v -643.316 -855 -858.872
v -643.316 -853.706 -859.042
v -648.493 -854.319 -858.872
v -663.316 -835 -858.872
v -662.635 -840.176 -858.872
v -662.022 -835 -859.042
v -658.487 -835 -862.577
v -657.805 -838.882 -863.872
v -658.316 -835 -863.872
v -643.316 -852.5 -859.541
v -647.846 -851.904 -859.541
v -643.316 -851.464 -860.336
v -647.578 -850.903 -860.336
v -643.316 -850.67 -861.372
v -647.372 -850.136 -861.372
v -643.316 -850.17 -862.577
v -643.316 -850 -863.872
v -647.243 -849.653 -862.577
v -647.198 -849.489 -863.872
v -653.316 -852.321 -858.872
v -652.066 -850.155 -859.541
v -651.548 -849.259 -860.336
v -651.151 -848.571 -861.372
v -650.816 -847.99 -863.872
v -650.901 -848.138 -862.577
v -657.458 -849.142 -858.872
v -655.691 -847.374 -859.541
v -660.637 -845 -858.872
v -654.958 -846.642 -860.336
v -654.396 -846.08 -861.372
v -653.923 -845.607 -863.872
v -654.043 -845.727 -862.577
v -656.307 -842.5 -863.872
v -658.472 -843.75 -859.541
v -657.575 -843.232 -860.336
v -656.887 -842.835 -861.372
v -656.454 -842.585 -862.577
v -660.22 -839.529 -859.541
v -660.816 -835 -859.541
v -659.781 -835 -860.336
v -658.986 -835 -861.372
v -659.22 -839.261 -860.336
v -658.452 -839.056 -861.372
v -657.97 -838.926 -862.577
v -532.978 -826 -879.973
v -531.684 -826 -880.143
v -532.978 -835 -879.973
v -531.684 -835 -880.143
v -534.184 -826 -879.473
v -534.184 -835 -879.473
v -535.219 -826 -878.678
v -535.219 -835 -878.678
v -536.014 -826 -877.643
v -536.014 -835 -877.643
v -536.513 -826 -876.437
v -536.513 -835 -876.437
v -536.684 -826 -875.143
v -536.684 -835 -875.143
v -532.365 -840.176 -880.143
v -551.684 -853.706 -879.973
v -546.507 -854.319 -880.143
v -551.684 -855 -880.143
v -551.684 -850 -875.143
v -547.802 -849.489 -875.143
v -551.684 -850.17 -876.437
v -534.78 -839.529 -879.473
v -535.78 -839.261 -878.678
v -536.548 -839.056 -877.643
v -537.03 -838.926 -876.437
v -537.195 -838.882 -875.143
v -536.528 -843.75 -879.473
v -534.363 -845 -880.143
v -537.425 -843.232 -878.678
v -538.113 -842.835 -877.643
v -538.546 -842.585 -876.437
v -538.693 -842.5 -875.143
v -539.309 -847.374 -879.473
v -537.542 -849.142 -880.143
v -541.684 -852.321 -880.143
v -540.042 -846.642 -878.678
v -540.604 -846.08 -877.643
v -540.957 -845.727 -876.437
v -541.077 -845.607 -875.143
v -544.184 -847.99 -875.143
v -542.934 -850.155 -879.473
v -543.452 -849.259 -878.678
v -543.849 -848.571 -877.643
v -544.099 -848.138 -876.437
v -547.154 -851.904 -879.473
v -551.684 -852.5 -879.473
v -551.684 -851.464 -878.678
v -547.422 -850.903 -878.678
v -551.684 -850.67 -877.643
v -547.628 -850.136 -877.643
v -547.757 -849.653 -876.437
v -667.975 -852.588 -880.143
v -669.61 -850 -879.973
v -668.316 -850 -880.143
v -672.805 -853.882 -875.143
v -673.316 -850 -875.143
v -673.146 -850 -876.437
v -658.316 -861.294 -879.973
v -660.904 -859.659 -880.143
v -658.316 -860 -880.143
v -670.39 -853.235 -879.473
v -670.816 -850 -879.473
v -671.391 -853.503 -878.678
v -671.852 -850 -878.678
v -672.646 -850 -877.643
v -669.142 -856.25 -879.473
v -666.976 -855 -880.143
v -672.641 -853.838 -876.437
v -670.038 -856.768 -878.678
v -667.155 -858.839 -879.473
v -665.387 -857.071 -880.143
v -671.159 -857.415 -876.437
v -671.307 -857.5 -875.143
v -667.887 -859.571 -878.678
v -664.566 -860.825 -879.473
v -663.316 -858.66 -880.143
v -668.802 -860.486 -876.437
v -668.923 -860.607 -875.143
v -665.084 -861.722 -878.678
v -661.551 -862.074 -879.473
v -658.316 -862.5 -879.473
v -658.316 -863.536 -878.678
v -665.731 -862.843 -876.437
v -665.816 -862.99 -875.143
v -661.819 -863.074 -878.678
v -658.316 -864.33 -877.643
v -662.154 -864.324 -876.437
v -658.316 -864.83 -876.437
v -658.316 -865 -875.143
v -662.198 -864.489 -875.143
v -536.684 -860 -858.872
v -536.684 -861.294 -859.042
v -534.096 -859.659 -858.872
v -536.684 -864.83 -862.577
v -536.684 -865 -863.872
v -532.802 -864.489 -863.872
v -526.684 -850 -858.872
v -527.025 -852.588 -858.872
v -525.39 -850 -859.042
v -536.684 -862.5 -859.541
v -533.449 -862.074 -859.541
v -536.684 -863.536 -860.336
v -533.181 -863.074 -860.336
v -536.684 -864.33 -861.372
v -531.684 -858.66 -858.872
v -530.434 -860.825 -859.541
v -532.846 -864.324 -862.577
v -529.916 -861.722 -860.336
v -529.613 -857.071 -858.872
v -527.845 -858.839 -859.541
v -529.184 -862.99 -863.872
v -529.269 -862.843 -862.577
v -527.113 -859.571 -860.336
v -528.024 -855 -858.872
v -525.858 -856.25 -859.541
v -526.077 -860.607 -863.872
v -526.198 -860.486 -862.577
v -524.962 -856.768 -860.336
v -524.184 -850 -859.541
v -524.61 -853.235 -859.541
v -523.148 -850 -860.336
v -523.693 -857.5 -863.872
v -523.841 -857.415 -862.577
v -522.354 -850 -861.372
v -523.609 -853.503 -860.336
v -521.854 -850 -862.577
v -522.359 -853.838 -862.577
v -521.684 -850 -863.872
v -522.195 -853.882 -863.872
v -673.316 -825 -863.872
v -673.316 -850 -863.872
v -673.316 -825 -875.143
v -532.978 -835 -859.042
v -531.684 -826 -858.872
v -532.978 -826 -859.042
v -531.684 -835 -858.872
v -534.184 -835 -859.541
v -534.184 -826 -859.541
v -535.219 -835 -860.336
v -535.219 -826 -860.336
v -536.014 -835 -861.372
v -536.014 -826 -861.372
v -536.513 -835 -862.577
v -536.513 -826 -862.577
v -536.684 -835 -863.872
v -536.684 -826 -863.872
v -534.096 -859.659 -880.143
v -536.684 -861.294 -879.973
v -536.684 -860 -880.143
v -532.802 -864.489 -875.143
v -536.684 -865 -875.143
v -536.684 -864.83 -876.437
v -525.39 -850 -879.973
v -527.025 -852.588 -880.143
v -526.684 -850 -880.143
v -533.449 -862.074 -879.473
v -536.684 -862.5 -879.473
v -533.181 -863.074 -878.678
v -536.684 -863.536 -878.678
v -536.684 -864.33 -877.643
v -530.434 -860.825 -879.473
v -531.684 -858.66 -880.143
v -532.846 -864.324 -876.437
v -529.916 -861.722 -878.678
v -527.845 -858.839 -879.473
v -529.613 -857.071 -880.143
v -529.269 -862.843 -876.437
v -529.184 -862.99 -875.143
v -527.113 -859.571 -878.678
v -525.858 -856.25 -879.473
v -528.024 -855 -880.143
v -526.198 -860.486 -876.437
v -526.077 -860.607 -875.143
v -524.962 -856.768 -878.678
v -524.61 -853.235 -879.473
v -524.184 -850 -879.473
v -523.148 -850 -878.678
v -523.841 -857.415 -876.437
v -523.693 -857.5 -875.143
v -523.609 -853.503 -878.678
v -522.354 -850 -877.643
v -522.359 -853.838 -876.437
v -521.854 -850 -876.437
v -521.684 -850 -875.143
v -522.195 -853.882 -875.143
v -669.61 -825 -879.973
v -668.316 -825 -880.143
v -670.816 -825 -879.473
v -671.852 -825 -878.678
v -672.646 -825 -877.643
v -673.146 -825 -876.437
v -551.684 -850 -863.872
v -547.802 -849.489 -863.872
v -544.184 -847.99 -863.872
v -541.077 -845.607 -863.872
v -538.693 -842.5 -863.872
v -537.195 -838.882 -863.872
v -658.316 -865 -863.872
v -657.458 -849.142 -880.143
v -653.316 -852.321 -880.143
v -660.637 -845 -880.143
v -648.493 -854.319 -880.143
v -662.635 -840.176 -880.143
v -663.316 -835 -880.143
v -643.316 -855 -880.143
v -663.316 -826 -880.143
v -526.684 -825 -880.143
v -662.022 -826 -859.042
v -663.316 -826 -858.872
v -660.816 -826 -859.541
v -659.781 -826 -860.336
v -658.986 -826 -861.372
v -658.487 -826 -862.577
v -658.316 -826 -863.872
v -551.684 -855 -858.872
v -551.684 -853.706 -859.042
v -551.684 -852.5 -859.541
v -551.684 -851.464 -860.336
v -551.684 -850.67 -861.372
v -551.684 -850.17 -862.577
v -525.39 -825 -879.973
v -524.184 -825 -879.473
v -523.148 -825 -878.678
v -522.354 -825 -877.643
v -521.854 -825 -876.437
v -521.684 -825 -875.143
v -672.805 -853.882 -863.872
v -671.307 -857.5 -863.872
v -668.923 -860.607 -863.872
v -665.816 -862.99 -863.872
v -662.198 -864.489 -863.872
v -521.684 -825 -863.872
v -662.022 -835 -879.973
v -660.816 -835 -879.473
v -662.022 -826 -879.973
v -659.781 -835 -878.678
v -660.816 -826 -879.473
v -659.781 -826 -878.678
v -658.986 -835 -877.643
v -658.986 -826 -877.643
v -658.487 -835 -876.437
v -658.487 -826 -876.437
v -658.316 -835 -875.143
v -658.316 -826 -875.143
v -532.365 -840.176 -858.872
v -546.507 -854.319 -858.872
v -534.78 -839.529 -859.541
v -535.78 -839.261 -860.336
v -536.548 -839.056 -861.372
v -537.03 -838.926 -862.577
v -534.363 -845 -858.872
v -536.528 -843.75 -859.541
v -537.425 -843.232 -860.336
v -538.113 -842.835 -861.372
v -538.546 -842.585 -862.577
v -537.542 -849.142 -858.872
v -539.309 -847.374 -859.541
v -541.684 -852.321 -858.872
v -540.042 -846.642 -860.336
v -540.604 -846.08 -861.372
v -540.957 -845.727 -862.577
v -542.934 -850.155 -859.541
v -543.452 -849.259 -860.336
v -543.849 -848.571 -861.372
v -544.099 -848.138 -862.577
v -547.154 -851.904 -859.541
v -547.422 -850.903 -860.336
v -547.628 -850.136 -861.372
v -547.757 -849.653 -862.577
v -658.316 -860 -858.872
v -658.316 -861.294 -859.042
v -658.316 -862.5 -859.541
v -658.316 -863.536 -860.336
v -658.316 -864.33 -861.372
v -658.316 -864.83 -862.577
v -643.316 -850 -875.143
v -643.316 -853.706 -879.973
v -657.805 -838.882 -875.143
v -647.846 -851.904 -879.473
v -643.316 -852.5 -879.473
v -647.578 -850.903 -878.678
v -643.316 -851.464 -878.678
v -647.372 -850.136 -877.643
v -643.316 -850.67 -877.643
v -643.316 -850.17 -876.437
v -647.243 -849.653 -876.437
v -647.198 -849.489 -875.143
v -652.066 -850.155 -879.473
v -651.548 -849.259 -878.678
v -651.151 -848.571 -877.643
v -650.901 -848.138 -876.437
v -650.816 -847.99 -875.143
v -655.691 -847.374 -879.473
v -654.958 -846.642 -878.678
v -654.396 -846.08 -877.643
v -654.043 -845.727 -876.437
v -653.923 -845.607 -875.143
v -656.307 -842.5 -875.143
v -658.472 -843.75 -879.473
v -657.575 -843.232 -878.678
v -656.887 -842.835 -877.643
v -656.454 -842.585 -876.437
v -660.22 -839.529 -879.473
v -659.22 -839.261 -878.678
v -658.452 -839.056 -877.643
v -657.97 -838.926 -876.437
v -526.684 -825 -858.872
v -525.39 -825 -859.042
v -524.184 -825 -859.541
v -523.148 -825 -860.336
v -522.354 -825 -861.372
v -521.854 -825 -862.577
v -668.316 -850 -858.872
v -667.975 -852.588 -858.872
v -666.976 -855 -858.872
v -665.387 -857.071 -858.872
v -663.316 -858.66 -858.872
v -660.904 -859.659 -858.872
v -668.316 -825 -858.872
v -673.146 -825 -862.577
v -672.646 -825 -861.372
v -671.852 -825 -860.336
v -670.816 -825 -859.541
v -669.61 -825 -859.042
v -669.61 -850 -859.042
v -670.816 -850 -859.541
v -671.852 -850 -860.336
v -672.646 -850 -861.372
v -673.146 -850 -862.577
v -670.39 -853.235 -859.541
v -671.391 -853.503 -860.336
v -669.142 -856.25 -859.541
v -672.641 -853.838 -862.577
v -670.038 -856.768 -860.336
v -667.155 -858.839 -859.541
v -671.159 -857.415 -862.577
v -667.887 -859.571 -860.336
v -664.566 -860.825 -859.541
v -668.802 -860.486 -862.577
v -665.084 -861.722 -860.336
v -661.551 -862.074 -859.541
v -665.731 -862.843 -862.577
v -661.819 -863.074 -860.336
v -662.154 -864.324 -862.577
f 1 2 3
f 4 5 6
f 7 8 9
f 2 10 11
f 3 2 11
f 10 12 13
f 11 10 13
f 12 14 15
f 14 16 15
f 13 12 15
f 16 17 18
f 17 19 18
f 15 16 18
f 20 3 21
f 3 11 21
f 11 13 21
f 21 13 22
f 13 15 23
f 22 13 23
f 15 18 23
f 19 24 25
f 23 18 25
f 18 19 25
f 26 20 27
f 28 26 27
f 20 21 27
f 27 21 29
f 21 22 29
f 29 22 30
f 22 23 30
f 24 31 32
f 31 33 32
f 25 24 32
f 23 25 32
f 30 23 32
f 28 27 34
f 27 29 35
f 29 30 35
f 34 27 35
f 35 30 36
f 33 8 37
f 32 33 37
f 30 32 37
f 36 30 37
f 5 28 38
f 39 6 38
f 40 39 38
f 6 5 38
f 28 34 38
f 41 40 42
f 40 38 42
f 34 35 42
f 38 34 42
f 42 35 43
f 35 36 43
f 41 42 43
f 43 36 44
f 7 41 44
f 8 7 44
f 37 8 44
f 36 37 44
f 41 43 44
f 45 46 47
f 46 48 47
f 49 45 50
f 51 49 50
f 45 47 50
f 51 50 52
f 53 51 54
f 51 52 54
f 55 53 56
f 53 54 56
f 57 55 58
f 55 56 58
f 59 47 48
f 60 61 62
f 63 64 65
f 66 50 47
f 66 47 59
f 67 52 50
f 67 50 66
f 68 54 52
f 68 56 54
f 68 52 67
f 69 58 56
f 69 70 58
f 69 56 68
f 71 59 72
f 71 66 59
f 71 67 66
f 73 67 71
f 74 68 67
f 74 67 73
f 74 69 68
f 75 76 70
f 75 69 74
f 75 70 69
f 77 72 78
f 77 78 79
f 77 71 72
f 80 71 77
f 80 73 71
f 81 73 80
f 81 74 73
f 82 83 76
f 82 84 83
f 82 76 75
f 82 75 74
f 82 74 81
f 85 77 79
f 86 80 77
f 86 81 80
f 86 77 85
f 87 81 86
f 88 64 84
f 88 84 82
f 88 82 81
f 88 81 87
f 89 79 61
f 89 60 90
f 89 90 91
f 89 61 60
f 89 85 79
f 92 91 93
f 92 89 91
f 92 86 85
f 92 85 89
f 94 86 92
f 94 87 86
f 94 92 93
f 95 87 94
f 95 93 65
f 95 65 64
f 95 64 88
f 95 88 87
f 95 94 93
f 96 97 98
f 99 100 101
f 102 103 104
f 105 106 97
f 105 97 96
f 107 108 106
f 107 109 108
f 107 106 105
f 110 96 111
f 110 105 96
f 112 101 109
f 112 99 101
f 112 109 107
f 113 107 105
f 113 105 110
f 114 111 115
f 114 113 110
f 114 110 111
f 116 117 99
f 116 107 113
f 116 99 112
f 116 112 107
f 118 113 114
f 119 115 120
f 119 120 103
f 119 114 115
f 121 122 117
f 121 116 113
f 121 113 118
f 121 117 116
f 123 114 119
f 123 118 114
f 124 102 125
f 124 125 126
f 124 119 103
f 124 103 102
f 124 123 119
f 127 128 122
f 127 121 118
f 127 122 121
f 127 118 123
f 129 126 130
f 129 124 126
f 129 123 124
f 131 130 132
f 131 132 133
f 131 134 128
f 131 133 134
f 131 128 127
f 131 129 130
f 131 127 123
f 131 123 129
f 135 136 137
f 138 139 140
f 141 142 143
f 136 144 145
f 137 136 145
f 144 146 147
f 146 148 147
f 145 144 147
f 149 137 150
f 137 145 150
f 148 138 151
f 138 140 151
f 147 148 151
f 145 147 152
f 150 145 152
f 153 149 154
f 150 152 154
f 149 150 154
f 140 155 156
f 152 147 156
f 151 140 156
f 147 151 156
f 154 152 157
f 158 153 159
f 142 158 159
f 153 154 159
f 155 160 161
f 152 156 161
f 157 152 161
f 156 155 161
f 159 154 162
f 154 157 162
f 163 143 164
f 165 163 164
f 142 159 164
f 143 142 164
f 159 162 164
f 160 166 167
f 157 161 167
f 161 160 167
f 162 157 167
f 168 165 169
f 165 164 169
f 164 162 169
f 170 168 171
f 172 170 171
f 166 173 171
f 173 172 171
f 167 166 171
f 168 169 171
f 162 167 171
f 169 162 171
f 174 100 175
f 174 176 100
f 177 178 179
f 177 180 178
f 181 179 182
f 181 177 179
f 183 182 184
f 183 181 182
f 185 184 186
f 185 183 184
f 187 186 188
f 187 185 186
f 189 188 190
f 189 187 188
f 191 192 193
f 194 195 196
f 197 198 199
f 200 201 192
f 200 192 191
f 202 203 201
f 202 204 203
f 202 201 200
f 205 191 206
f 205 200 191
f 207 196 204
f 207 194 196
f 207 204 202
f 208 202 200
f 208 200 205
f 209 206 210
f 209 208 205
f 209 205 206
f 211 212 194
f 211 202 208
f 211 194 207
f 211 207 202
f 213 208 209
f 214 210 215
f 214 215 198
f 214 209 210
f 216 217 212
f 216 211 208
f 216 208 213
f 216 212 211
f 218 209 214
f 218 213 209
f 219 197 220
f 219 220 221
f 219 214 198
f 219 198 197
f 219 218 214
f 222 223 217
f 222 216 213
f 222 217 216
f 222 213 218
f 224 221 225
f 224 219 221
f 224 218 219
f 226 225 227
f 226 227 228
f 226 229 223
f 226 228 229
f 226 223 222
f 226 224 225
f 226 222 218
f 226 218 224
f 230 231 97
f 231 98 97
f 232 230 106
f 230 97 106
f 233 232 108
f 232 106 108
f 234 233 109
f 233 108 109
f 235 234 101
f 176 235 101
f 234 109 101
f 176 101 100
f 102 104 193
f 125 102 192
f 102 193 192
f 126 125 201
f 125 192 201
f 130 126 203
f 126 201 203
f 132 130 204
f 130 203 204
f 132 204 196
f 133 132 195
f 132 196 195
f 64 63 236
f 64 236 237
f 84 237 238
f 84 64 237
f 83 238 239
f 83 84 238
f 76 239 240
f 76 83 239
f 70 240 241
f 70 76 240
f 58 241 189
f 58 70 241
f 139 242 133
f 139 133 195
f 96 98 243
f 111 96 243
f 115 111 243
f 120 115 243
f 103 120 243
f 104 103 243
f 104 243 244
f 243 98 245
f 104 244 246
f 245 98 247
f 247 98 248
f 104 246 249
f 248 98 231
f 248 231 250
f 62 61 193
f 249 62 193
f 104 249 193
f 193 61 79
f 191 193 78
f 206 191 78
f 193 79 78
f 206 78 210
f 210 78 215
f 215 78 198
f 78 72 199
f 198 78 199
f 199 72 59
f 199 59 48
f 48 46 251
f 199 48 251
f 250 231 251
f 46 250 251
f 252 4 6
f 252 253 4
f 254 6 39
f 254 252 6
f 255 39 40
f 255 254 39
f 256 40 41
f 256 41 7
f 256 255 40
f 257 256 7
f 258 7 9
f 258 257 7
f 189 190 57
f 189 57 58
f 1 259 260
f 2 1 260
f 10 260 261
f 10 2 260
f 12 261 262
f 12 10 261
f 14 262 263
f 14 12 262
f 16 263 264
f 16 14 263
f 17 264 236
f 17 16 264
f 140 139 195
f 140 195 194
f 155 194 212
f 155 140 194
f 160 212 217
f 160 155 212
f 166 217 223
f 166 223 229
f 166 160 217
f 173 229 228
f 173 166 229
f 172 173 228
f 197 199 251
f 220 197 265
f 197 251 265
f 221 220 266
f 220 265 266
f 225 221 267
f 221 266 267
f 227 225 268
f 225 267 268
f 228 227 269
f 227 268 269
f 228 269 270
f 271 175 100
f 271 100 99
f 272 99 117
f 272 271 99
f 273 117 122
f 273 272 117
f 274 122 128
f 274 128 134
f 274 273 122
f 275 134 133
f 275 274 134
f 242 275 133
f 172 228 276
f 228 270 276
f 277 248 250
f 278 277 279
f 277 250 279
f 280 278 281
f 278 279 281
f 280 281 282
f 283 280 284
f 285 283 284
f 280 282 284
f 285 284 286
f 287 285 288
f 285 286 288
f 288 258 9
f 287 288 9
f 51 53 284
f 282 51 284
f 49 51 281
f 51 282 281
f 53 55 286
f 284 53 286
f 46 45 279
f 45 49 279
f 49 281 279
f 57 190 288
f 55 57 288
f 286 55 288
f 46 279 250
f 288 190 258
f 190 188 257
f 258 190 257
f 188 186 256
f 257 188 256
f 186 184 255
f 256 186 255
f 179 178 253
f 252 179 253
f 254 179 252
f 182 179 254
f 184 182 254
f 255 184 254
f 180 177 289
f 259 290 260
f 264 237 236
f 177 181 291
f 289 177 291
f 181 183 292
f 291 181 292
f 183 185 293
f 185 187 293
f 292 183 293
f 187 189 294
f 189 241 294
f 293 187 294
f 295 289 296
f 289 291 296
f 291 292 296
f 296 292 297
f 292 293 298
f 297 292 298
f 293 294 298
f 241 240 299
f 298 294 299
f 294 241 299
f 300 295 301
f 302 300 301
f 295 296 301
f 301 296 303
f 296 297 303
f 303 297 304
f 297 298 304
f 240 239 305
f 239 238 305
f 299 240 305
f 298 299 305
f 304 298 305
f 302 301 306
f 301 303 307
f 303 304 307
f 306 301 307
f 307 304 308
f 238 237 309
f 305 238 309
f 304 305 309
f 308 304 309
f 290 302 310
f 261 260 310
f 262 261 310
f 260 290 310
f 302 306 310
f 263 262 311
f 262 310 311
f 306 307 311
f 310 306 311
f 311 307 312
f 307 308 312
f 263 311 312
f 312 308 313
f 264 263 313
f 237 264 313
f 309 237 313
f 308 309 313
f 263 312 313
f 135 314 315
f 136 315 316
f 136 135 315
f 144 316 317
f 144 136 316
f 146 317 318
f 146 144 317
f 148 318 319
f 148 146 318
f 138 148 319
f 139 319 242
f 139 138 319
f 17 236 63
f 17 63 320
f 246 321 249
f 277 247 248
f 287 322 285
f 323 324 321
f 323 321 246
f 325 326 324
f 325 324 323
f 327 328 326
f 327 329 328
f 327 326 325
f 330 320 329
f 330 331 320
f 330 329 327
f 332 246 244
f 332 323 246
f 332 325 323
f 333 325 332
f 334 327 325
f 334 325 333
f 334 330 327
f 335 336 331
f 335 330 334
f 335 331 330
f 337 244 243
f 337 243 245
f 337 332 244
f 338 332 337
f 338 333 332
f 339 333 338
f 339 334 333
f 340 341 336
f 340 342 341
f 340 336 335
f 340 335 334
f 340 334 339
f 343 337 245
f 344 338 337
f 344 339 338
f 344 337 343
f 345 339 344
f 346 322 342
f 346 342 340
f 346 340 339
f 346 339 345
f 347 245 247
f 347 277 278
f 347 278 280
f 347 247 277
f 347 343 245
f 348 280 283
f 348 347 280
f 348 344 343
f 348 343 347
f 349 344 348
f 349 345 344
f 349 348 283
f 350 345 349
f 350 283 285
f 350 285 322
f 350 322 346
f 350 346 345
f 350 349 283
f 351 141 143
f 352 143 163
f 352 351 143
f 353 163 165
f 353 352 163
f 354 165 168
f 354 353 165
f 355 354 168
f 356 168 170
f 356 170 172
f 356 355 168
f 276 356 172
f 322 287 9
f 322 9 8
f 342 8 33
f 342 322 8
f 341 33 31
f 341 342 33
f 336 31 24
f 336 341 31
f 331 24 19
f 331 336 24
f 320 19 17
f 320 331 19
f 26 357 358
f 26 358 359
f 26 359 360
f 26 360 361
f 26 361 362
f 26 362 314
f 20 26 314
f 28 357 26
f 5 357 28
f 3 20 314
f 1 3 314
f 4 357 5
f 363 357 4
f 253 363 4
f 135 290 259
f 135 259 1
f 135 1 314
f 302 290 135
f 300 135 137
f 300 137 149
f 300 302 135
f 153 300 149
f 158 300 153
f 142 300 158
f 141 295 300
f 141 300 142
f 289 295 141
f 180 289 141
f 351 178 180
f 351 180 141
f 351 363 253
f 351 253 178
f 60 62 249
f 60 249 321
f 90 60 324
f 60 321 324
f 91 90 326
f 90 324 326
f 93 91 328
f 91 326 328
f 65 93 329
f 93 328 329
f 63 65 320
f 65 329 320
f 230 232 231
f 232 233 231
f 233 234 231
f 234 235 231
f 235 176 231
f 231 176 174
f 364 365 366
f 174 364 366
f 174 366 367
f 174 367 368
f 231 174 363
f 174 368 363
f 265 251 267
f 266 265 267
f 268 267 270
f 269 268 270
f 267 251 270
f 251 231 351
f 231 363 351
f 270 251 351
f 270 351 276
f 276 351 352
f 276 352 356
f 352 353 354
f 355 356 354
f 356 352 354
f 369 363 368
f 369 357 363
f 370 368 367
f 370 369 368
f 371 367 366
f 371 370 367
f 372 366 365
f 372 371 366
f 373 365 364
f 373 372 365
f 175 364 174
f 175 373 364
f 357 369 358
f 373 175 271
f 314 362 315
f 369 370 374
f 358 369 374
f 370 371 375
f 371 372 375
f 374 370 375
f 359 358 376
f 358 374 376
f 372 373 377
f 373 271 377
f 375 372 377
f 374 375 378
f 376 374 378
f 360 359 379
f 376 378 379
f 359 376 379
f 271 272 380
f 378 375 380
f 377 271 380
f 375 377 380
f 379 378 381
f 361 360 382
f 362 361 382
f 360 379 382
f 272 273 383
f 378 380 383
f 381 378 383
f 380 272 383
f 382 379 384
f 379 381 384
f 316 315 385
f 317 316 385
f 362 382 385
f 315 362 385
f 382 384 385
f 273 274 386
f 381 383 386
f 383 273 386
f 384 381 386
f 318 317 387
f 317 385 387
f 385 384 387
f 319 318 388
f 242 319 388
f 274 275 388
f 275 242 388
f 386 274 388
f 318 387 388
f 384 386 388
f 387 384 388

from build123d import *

# Parameters (mm, degrees)
SKETCH018_W     = 151.632408
SKETCH018_H     = 21.2714
PAD011_DEPTH    = 40
SKETCH019_W     = 121.632408
SKETCH019_H     = 24
POCKET007_DEPTH = 21.2724
FILLET010_R     = 15
FILLET011_R     = 5


with BuildPart() as part:
    # Sketch018 (on Face1 of CopyPocket006) → Pad011 (new body)
    with BuildSketch(Plane.XZ.offset(825)):
        with Locations((-597.5, -869.507206)):
            Rectangle(SKETCH018_W, SKETCH018_H)
    extrude(amount=PAD011_DEPTH)

    # Sketch019 (on Face4 of Pad011) → Pocket007 (cut, through all)
    with BuildSketch(Plane(origin=(0, 0, -858.871506), x_dir=(-1, 0, 0), z_dir=(0, 0, 1))):
        with Locations((597.5, 838)):
            Rectangle(SKETCH019_W, SKETCH019_H)
    extrude(amount=-POCKET007_DEPTH, mode=Mode.SUBTRACT)

    # Fillet010
    fillet010_edges = [part.edges().sort_by_distance(p)[0] for p in [
        (-673.316204, -865, -869.507206),
        (-521.683796, -865, -869.507206),
        (-658.316204, -850, -869.507206),
        (-536.683796, -850, -869.507206),
    ]]
    fillet(fillet010_edges, radius=FILLET010_R)

    # Fillet011
    fillet011_edges = [part.edges().sort_by_distance(p)[0] for p in [
        (-597.5, -850, -858.871506),
        (-597.5, -850, -880.142906),
        (-597.5, -865, -858.871506),
        (-597.5, -865, -880.142906),
    ]]
    fillet(fillet011_edges, radius=FILLET011_R)


solid = part.part
